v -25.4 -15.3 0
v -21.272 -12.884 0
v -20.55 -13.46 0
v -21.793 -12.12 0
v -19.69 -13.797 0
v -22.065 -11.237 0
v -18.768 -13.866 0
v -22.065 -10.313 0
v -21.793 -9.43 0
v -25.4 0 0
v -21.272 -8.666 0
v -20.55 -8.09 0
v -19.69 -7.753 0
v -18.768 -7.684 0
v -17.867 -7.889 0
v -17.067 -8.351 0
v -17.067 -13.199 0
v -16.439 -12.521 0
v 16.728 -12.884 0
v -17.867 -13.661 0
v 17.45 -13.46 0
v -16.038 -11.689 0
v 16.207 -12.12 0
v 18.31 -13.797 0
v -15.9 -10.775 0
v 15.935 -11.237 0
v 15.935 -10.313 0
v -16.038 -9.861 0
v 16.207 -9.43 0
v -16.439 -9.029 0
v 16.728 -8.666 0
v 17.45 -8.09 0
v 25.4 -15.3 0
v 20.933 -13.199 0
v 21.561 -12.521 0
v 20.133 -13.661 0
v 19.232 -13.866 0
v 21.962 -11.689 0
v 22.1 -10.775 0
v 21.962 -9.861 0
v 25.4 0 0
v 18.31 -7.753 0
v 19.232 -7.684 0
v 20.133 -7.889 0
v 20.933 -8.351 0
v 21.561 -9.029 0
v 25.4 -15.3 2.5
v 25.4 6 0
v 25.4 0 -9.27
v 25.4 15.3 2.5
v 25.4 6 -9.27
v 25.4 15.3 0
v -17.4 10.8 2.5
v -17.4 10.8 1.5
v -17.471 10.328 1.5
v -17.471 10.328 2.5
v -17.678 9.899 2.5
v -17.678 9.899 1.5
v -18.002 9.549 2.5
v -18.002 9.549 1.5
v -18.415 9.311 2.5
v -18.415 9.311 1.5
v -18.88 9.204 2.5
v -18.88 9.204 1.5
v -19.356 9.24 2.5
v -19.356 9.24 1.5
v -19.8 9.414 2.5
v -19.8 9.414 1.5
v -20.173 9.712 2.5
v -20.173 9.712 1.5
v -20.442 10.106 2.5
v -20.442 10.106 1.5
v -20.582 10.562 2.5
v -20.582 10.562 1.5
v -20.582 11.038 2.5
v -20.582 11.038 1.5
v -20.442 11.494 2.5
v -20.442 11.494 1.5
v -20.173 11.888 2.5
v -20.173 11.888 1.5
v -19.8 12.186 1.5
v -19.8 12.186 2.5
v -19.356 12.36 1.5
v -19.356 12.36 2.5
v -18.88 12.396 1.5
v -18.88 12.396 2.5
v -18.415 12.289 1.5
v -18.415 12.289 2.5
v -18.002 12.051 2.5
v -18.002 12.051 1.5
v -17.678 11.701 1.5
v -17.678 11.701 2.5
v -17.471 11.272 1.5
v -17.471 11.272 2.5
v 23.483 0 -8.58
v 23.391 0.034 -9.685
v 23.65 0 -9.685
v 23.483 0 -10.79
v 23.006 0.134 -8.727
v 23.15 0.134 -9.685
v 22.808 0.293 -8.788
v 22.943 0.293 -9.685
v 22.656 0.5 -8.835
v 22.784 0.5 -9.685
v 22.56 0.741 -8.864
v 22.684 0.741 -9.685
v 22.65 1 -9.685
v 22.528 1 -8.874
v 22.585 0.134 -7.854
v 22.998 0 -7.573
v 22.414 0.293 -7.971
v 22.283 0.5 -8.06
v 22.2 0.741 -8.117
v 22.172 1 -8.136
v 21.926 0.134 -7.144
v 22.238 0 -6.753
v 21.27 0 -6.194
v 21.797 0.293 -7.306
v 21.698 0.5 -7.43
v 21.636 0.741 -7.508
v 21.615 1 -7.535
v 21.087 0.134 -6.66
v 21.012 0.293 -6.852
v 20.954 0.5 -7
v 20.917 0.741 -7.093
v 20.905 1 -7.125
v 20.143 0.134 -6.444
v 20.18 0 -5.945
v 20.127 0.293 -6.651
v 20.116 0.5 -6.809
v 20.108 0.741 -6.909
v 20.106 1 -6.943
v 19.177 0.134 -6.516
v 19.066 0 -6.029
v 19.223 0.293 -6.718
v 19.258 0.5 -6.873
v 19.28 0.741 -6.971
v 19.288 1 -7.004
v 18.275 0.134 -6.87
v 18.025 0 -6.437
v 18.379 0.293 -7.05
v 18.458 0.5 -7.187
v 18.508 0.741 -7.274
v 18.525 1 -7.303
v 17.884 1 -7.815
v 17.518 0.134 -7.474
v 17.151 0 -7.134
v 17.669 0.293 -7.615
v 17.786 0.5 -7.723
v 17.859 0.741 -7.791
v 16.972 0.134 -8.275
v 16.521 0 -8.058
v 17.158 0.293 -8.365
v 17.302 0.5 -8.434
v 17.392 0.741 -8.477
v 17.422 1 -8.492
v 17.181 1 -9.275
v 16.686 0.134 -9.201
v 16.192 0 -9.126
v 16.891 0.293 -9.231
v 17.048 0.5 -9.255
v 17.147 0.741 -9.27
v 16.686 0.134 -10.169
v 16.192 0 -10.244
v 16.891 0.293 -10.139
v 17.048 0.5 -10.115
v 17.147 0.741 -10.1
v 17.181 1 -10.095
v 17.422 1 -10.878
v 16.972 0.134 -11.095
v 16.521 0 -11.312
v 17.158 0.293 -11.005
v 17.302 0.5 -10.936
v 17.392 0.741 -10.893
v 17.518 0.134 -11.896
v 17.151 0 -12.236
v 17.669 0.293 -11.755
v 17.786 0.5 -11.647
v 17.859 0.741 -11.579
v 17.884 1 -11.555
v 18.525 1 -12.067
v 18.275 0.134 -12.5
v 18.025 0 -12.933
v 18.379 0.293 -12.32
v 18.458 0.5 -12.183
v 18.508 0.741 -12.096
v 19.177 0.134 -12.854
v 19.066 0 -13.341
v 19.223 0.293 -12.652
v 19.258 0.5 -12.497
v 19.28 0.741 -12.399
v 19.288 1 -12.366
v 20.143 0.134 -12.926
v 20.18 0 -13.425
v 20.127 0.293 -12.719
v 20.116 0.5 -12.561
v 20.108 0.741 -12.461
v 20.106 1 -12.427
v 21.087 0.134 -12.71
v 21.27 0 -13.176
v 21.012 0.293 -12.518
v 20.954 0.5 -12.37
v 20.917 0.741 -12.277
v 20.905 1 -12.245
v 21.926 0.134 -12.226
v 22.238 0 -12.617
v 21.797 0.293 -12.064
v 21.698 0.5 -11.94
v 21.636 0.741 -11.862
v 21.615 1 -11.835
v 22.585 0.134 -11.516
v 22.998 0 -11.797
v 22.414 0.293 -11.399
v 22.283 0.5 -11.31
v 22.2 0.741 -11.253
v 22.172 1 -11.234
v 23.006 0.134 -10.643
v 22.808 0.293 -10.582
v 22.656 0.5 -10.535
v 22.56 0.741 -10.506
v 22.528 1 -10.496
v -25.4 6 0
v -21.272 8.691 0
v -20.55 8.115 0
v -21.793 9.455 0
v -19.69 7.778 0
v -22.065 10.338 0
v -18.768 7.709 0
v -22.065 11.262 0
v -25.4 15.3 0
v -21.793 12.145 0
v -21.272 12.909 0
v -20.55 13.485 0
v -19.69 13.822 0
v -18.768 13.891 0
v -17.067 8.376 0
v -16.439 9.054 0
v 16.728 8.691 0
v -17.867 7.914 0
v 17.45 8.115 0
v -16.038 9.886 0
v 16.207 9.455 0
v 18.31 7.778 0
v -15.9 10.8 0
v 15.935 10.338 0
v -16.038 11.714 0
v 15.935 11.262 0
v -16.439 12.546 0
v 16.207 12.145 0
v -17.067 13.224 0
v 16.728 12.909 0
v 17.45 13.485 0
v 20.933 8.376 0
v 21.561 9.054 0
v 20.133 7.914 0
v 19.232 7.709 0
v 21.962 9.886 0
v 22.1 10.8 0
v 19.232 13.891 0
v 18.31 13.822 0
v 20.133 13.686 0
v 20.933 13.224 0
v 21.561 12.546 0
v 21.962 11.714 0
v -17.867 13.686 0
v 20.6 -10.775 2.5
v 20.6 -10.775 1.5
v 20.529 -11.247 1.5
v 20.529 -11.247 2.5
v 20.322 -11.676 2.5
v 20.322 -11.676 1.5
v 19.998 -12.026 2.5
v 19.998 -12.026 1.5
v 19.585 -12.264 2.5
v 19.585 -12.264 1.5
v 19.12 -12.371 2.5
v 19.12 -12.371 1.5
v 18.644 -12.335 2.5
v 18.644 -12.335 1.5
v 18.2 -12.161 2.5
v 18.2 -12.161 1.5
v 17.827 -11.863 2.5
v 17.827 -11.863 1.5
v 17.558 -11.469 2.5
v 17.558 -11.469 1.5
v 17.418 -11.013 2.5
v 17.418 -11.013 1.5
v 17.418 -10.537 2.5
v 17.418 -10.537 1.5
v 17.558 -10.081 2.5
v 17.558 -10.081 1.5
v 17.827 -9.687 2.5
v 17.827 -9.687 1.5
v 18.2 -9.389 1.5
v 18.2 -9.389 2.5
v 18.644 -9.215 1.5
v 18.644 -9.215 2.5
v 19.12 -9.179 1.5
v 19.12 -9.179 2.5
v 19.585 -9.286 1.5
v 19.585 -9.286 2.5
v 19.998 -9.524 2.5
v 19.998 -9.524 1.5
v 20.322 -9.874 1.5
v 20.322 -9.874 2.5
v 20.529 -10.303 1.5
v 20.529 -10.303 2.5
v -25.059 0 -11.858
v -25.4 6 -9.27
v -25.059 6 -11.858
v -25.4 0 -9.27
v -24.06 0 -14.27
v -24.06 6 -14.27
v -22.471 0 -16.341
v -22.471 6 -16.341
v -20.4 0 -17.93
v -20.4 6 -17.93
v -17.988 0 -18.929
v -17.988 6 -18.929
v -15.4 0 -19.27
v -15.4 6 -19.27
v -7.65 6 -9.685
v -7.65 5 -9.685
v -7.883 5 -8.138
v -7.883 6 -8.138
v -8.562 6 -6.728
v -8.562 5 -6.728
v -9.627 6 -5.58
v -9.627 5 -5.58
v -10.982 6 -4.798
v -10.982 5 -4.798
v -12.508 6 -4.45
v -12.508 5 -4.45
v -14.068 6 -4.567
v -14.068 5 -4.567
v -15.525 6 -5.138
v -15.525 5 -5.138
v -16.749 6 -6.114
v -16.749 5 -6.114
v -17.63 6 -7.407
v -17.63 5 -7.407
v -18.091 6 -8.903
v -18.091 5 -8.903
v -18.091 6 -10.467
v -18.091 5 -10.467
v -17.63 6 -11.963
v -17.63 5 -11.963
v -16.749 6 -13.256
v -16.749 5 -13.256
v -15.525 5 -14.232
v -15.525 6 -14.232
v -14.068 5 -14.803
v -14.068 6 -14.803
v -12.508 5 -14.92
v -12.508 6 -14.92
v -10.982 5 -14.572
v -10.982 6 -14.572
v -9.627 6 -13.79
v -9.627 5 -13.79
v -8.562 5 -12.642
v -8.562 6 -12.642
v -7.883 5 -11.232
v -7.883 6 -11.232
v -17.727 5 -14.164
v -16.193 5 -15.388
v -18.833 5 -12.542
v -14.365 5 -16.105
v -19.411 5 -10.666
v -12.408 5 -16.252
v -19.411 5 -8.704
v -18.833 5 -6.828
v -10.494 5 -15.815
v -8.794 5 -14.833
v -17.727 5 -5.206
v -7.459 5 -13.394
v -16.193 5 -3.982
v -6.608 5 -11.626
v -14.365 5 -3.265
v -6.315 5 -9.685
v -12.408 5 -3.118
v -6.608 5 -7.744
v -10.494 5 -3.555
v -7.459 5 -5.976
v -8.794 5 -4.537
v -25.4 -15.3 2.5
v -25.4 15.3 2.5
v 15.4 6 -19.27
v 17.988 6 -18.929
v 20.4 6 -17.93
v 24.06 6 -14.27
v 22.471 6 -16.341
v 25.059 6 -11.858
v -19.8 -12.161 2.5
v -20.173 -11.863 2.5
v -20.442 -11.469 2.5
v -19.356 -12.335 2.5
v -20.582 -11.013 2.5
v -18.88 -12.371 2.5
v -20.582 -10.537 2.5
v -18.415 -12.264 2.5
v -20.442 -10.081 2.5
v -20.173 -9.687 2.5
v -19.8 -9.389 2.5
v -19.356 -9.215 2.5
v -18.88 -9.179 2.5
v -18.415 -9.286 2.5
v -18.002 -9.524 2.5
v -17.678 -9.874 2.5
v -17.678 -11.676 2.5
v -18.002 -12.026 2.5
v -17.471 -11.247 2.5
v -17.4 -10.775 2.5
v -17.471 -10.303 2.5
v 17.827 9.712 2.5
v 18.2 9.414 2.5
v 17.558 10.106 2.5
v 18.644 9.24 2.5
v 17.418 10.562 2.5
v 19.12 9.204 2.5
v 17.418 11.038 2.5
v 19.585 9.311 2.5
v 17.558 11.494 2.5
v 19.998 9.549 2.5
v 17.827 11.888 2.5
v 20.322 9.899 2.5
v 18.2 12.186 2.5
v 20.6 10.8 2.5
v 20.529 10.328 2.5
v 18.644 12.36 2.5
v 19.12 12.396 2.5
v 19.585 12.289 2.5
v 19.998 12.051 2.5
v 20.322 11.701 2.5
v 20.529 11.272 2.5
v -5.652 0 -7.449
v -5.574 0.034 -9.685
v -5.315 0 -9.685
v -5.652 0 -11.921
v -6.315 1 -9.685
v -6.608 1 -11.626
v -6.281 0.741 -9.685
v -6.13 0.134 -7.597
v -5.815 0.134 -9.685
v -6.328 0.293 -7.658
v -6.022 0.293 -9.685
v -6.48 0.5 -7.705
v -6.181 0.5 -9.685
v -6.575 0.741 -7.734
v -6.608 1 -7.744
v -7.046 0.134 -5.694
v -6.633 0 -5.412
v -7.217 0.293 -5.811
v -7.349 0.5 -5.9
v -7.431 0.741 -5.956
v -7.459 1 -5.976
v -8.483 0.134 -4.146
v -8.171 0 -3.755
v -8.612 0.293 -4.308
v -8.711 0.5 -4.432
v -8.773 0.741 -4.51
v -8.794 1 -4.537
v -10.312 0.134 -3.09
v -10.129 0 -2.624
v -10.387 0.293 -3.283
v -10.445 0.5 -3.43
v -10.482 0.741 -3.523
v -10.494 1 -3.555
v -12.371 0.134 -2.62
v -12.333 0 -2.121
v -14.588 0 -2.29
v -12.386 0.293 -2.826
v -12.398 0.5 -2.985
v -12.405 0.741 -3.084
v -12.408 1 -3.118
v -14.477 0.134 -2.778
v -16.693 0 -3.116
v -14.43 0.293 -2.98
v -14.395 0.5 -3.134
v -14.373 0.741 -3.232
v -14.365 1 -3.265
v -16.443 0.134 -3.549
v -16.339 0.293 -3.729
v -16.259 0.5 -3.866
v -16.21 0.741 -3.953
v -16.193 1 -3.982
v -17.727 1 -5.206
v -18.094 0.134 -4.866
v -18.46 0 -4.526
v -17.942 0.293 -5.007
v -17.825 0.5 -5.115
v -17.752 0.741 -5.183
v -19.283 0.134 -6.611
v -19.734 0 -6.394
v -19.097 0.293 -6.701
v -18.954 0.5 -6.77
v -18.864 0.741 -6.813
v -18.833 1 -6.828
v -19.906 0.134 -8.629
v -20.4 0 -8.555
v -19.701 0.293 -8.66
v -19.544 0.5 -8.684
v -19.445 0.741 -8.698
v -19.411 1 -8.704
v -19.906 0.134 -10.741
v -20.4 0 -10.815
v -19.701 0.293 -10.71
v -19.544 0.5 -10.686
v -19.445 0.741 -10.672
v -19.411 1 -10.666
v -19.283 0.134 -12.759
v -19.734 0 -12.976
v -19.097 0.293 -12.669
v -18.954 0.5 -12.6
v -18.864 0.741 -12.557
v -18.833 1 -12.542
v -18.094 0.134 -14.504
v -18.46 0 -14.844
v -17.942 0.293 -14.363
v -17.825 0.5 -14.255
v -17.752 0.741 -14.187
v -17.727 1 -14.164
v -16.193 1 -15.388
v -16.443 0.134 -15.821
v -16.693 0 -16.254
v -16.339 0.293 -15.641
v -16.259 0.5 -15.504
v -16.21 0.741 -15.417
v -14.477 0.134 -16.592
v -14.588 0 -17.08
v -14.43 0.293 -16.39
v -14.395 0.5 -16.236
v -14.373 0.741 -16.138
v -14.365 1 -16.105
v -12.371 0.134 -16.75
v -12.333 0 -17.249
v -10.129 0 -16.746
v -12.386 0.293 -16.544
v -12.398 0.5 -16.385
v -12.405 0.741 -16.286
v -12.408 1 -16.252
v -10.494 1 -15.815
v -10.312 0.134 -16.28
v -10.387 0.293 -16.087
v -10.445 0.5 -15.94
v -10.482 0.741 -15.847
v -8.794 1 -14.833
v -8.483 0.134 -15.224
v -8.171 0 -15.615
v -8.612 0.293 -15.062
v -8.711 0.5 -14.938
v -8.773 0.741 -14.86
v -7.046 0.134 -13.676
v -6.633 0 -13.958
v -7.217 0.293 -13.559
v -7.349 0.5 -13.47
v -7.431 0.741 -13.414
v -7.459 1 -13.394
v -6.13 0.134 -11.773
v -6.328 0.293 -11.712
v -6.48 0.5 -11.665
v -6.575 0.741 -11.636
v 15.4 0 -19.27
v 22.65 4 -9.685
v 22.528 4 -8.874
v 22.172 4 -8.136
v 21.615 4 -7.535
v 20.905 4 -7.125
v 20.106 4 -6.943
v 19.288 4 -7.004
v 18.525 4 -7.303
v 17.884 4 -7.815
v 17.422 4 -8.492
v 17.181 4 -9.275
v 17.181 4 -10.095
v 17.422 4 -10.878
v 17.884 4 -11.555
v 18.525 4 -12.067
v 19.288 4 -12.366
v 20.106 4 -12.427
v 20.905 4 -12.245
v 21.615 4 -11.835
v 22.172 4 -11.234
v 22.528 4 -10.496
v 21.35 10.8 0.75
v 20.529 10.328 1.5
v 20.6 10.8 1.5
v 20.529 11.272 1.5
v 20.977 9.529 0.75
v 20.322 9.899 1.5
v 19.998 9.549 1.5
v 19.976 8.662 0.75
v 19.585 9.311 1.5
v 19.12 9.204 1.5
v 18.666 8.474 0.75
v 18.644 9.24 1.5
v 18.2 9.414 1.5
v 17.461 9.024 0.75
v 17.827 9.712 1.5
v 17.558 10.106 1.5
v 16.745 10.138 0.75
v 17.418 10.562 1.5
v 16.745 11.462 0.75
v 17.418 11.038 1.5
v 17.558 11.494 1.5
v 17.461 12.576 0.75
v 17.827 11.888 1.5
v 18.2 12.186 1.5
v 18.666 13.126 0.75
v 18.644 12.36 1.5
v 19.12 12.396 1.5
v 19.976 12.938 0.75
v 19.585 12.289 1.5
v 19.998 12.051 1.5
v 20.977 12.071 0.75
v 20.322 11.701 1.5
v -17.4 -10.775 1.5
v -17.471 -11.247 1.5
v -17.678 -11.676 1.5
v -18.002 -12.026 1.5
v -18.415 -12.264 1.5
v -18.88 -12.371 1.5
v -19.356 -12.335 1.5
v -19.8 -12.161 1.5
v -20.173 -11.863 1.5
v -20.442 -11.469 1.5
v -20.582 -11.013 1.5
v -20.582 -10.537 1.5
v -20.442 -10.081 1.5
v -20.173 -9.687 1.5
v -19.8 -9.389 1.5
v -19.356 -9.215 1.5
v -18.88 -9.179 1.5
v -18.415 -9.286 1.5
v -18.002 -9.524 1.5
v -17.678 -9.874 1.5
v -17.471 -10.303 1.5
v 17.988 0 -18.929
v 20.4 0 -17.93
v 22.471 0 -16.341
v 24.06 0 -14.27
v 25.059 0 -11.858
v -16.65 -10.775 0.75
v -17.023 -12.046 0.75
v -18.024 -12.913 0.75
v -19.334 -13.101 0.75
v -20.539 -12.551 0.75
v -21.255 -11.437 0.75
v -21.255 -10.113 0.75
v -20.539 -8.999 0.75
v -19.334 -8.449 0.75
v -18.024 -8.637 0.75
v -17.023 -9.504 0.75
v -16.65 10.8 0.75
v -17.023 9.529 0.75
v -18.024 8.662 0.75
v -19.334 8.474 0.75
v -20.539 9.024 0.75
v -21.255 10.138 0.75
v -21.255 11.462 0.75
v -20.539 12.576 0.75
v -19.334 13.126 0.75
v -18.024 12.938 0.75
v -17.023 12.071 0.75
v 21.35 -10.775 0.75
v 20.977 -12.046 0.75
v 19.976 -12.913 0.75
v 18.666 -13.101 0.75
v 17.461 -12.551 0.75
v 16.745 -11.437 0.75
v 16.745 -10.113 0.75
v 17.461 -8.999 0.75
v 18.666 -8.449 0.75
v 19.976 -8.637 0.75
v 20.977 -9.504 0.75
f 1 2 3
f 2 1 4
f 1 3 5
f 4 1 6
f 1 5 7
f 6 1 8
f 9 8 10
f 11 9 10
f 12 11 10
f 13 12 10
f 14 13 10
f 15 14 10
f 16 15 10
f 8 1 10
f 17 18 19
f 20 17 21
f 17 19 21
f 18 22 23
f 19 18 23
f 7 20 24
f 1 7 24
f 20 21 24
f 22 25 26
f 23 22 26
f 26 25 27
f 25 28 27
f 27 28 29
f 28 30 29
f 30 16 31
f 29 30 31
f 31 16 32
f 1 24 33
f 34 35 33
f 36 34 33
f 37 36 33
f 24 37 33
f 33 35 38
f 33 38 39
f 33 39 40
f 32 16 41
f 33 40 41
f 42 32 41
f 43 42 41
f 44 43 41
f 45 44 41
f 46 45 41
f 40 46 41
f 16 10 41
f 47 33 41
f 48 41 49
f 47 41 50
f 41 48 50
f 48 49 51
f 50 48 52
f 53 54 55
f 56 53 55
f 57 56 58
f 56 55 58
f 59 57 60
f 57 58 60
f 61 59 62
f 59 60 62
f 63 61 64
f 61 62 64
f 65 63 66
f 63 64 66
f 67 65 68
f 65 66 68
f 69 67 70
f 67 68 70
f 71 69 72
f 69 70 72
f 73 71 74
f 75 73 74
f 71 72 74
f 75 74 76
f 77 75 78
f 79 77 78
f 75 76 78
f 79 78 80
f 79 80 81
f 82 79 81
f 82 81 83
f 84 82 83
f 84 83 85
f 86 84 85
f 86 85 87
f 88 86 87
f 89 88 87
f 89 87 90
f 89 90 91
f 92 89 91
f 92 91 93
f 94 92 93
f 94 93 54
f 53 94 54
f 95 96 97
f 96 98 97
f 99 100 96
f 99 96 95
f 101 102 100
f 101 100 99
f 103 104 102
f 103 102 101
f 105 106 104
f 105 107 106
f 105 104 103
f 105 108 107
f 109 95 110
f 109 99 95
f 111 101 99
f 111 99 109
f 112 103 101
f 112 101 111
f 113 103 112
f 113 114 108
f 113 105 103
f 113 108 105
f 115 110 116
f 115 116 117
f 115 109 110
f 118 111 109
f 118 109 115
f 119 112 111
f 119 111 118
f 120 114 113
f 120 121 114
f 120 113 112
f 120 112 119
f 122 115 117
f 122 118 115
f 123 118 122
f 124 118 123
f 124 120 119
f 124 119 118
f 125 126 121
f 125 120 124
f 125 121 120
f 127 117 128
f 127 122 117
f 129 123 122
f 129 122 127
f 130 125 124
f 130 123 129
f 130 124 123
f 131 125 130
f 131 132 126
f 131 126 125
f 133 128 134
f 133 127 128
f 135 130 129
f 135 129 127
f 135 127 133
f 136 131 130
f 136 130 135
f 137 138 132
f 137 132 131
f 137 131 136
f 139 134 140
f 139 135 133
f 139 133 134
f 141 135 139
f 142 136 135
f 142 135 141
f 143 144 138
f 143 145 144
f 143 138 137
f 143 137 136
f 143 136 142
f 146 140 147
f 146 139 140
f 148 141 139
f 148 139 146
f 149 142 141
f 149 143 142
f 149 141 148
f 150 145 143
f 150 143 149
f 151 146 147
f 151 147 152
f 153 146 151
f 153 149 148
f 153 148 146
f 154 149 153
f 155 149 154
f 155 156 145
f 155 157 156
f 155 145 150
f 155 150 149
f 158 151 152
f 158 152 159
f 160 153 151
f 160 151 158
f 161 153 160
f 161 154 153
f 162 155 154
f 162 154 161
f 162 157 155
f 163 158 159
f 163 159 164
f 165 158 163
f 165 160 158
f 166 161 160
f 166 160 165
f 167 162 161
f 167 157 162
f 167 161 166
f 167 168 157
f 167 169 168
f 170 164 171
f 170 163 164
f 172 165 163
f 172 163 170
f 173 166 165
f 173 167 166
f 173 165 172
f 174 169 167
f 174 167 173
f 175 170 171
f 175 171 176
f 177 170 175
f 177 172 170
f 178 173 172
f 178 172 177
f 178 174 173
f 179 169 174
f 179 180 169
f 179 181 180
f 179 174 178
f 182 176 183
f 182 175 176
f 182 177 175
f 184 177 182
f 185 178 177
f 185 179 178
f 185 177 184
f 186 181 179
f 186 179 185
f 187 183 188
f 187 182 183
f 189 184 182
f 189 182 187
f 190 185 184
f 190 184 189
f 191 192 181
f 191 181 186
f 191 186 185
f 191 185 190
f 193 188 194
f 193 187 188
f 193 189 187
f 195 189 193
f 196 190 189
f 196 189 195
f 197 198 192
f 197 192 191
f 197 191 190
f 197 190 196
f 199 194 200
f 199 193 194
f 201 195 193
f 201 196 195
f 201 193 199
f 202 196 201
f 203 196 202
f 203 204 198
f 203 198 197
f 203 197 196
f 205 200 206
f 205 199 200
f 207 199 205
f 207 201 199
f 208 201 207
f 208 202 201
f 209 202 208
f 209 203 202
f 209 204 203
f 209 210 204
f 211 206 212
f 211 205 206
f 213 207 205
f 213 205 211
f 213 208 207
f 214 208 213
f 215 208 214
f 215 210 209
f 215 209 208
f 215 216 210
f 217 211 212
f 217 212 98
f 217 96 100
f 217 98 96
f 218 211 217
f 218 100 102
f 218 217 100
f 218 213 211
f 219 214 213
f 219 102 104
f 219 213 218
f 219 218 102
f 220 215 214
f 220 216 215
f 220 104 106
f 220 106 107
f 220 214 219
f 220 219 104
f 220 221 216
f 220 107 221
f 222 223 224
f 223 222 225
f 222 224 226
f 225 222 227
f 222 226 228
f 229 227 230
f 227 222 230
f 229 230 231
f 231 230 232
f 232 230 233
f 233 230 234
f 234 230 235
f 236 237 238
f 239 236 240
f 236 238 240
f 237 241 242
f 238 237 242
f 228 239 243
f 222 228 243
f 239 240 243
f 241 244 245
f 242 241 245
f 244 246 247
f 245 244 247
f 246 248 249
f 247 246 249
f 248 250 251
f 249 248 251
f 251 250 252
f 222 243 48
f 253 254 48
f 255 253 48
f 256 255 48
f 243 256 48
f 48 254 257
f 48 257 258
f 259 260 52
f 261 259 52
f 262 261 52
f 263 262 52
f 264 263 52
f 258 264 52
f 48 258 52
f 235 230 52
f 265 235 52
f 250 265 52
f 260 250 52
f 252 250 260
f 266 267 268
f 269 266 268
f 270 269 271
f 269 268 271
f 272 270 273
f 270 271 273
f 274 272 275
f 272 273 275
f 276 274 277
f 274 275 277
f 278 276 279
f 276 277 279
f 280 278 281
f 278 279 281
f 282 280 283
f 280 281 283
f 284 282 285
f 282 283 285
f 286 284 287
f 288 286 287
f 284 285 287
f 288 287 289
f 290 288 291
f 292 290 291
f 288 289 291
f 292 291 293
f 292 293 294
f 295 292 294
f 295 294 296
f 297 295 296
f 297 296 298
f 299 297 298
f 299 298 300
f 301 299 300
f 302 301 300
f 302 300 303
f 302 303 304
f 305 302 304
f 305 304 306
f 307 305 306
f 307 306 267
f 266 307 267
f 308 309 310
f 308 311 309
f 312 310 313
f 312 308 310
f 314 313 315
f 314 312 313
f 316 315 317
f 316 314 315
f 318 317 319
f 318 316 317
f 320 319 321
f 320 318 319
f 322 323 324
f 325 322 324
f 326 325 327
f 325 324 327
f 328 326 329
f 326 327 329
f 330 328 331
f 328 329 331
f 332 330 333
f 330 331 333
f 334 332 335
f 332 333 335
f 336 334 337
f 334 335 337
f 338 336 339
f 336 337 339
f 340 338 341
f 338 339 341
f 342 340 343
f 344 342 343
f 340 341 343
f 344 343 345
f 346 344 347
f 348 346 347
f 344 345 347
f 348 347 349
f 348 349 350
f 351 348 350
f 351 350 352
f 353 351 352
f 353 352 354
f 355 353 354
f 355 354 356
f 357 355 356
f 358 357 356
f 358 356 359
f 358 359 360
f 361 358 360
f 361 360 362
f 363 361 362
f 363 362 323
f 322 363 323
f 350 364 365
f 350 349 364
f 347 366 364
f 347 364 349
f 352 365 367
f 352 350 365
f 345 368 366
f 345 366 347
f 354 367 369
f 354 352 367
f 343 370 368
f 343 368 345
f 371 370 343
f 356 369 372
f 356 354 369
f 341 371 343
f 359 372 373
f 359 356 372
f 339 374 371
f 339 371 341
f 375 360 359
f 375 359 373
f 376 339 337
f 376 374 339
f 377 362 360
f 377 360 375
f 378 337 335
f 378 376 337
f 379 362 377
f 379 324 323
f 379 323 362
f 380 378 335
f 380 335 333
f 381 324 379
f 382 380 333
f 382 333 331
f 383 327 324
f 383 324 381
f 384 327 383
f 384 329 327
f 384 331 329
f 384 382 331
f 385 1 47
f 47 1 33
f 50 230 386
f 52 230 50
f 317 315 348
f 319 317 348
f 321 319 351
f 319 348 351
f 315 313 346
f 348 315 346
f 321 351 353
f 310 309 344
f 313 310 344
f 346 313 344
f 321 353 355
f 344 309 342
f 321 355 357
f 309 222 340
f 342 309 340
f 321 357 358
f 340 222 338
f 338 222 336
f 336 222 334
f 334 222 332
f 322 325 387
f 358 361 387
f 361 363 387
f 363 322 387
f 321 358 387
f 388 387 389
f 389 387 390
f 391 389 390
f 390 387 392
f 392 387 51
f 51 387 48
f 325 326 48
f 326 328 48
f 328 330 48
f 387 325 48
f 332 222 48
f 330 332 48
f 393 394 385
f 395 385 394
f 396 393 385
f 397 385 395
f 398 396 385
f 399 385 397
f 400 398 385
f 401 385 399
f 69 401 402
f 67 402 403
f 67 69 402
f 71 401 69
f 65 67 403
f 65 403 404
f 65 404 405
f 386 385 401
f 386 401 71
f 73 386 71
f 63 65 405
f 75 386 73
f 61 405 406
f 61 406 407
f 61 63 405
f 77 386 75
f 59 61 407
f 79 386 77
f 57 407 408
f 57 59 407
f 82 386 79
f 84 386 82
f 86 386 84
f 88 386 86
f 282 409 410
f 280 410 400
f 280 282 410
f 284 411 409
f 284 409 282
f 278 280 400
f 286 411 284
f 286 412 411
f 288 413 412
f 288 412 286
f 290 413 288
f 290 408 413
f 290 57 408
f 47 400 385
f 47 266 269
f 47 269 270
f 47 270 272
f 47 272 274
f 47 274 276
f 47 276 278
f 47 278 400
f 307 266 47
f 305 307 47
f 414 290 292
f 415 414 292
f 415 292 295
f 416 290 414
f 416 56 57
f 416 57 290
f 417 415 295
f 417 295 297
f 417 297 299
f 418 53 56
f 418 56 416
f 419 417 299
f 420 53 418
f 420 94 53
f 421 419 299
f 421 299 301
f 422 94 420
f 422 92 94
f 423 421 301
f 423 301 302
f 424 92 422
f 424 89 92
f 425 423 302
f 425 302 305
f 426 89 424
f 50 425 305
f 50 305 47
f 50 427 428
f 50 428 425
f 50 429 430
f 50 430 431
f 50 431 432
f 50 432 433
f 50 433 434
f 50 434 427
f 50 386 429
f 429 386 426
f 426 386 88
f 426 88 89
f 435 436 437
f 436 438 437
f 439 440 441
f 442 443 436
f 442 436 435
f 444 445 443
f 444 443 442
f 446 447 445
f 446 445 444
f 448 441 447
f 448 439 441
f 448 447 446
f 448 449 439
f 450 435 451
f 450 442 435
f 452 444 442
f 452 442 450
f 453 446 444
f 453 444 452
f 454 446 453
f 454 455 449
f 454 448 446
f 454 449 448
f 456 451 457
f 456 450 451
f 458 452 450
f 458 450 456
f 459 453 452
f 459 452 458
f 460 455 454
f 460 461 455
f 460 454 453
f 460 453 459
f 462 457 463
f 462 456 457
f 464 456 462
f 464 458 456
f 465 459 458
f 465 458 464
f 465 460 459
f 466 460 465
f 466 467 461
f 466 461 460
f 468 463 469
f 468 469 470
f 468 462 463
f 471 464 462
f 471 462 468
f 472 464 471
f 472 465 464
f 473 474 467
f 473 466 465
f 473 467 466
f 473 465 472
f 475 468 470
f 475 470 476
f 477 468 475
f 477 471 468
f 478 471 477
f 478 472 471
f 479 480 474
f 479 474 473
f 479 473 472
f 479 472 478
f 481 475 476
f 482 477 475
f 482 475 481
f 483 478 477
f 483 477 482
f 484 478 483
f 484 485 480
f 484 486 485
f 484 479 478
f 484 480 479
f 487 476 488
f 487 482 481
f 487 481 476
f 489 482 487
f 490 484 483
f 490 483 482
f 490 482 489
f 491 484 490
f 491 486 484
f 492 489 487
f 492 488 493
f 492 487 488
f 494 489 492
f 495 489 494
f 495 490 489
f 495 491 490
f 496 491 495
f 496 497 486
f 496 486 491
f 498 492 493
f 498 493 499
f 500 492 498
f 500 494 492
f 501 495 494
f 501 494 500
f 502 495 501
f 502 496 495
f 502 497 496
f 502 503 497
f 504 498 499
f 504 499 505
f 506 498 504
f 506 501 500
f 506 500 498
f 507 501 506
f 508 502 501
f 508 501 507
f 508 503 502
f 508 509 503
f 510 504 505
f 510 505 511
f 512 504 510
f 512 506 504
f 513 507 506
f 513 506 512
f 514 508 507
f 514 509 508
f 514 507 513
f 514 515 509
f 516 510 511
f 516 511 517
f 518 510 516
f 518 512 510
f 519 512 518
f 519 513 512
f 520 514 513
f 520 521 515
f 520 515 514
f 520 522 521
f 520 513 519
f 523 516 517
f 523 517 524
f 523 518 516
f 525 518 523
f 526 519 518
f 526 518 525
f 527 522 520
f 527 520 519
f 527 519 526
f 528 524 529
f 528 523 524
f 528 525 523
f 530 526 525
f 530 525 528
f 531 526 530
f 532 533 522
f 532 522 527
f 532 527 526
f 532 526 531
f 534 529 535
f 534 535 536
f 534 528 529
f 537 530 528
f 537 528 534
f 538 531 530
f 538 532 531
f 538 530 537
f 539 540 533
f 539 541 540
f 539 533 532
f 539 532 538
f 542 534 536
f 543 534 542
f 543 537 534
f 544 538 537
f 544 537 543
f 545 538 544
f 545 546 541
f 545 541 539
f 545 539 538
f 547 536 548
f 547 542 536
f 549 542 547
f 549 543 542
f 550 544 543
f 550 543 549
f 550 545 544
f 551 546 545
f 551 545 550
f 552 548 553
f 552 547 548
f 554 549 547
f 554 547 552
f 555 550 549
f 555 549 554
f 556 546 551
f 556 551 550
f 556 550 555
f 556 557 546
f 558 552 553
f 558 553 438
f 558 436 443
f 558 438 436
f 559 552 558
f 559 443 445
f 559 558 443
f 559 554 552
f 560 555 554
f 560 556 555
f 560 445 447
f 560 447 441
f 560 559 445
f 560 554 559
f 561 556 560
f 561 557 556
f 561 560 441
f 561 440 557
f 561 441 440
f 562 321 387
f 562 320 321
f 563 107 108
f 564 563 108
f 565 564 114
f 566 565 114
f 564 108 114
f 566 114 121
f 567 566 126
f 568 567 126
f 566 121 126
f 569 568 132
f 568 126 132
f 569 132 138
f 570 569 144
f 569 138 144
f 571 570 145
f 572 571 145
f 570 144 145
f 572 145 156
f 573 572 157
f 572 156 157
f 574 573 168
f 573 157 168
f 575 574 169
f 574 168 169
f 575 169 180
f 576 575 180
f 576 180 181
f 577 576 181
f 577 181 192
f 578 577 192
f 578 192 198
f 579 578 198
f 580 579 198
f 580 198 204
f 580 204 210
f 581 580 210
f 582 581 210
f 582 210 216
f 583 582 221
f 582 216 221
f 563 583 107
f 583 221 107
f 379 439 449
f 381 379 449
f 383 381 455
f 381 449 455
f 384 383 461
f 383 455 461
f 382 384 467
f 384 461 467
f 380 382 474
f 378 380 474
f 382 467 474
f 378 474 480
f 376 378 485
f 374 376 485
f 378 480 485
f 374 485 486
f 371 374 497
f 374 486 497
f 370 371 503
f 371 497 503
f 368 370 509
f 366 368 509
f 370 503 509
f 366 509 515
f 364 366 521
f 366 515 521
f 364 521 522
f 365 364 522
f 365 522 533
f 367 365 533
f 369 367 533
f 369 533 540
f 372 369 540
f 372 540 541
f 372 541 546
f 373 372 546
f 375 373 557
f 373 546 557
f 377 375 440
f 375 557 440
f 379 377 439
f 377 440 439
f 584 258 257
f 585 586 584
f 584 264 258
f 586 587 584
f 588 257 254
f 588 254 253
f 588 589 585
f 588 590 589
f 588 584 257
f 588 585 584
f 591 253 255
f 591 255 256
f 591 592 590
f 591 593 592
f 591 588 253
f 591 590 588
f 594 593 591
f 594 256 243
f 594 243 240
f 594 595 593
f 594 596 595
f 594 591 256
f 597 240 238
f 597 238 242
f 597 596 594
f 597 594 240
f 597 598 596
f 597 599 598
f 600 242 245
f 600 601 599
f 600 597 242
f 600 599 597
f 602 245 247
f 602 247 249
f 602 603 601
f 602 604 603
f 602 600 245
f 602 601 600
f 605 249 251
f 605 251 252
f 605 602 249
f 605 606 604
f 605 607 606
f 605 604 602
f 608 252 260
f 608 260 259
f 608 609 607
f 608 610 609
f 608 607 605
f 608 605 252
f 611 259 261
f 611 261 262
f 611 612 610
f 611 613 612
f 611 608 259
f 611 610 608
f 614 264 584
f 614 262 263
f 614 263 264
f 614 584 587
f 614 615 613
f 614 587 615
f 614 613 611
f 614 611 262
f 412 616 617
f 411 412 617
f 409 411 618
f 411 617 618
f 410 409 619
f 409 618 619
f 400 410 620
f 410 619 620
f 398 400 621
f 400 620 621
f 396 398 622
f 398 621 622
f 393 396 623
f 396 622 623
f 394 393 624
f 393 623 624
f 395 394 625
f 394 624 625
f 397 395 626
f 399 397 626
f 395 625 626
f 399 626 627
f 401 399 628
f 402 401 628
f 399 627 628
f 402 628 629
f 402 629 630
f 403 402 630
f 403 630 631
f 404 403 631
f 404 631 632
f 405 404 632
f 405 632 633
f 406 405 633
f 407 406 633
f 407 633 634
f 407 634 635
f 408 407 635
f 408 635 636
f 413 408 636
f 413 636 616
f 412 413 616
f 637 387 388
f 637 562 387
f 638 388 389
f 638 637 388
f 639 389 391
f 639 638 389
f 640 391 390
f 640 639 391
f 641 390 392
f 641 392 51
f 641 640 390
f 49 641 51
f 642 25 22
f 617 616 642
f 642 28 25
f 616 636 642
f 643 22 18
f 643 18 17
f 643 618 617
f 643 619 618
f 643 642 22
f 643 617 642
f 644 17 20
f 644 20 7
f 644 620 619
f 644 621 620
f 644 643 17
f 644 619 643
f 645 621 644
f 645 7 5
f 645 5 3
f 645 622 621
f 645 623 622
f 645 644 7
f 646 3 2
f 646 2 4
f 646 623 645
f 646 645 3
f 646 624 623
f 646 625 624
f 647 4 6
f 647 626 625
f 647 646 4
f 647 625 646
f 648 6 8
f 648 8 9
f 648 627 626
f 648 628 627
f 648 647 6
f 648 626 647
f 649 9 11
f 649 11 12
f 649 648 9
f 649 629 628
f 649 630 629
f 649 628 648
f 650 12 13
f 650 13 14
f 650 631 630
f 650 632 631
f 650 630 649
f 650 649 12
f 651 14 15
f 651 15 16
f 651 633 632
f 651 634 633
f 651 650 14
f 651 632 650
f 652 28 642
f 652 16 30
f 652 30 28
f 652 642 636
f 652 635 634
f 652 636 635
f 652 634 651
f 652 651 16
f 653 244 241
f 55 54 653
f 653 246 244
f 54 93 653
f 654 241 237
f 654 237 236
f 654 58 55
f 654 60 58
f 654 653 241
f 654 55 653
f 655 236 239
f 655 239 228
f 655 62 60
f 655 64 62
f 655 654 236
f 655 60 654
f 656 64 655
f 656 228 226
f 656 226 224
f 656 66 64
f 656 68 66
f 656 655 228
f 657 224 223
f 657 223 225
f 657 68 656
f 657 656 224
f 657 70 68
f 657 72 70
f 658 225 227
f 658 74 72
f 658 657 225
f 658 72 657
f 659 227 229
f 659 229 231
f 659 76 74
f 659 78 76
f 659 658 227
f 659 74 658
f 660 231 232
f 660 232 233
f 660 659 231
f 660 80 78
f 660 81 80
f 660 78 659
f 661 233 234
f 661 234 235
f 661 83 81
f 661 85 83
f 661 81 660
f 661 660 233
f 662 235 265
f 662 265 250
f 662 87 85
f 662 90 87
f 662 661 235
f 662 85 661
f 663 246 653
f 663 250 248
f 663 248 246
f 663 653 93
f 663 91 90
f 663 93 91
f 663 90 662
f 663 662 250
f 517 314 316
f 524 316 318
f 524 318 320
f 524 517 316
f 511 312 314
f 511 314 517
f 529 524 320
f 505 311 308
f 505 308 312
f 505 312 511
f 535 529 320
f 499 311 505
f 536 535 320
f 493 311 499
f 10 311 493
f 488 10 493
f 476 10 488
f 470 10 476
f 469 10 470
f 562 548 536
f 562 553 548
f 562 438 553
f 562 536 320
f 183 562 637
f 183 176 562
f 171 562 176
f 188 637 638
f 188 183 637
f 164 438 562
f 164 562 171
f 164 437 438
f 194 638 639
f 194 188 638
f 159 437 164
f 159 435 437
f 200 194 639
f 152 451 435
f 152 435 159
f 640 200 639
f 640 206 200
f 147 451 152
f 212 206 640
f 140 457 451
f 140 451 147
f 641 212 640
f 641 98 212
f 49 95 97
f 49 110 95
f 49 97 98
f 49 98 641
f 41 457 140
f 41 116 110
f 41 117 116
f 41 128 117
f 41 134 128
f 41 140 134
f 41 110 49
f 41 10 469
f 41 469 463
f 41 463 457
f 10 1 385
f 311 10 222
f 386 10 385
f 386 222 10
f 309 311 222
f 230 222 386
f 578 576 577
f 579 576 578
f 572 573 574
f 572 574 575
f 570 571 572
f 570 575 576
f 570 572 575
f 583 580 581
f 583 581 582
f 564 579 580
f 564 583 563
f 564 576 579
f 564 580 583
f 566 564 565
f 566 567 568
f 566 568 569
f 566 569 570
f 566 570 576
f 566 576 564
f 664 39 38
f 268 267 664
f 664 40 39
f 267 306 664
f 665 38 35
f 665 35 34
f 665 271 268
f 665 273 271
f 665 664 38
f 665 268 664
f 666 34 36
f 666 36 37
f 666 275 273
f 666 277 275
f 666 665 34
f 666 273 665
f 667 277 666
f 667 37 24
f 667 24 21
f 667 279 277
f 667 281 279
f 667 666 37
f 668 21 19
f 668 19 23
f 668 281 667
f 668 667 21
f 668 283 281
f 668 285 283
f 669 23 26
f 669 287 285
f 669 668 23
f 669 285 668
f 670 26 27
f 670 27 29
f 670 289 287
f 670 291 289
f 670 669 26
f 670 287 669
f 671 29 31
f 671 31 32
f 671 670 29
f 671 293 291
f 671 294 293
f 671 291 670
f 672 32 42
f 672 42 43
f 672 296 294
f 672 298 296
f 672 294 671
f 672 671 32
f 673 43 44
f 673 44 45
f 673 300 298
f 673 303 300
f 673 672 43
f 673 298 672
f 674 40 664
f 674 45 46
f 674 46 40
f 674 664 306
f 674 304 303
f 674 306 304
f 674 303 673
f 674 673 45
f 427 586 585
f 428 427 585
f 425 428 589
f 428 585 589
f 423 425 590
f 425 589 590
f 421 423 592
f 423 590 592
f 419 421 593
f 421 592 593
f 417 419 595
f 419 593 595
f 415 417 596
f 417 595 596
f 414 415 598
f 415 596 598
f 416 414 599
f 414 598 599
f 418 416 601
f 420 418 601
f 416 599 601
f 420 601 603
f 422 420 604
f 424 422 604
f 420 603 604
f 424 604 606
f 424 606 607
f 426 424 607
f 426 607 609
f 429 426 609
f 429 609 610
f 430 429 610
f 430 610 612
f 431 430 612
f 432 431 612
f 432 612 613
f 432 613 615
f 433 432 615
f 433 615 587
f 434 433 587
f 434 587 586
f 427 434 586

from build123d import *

# Parameters (mm, degrees)
SKETCH084_W     = 50.8
SKETCH084_H     = 30.6
PAD021_DEPTH    = 2.5
SKETCH085_R     = 1.6
POCKET071_DEPTH = 2.501
SKETCH086_W     = 50.8
SKETCH086_H     = 6
PAD022_DEPTH    = 19.27
SKETCH087_R     = 6.585
POCKET072_DEPTH = 5
SKETCH088_R     = 2.75
POCKET073_DEPTH = 4
SKETCH089_R     = 5.25
POCKET074_DEPTH = 10.301
CHAMFER013_SIZE = 1.5
FILLET002_R     = 1
FILLET003_R     = 10


with BuildPart() as part:
    # Sketch084 → Pad021 (new body)
    with BuildSketch(Plane.XY):
        Rectangle(SKETCH084_W, SKETCH084_H)
    extrude(amount=PAD021_DEPTH)

    # Sketch085 (on Face5 of Pad021) → Pocket071 (cut, through all)
    with BuildSketch(Plane(origin=(0, 0, 0), x_dir=(1, 0, 0), z_dir=(0, 0, -1))):
        with Locations((-19, 10.775)):
            Circle(SKETCH085_R)
        with Locations((19, 10.775)):
            Circle(SKETCH085_R)
        with Locations((19, -10.8)):
            Circle(SKETCH085_R)
        with Locations((-19, -10.8)):
            Circle(SKETCH085_R)
    extrude(amount=-POCKET071_DEPTH, mode=Mode.SUBTRACT)

    # Sketch086 (on Face4 of Pocket071) → Pad022 (join)
    with BuildSketch(Plane(origin=(0, 0, 0), x_dir=(1, 0, 0), z_dir=(0, 0, -1))):
        with Locations((0, -3)):
            Rectangle(SKETCH086_W, SKETCH086_H)
    extrude(amount=PAD022_DEPTH)

    # Sketch087 (on Face12 of Pad022) → Pocket072 (cut)
    with BuildSketch(Plane.XZ):
        with Locations((-12.9, -9.685)):
            Circle(SKETCH087_R)
    extrude(amount=-POCKET072_DEPTH, mode=Mode.SUBTRACT)

    # Sketch088 (on Face12 of Pocket072) → Pocket073 (cut)
    with BuildSketch(Plane.XZ):
        with Locations((19.9, -9.685)):
            Circle(SKETCH088_R)
    extrude(amount=-POCKET073_DEPTH, mode=Mode.SUBTRACT)

    # Sketch089 (on Face20 of Pocket073) → Pocket074 (cut, through all)
    with BuildSketch(Plane.XZ.offset(-5)):
        with Locations((-12.9, -9.685)):
            Circle(SKETCH089_R)
    extrude(amount=-POCKET074_DEPTH, mode=Mode.SUBTRACT)

    # Chamfer013
    chamfer013_edges = [part.edges().sort_by_distance(p)[0] for p in [
        (-20.6, -10.775, 0),
        (17.4, -10.775, 0),
        (17.4, 10.8, 0),
        (-20.6, 10.8, 0),
    ]]
    chamfer(chamfer013_edges, length=CHAMFER013_SIZE)

    # Fillet002
    fillet002_edges = [part.edges().sort_by_distance(p)[0] for p in [
        (-19.485, 0, -9.685),
        (17.15, 0, -9.685),
    ]]
    fillet(fillet002_edges, radius=FILLET002_R)

    # Fillet003
    fillet003_edges = [part.edges().sort_by_distance(p)[0] for p in [
        (-25.4, 3, -19.27),
        (25.4, 3, -19.27),
    ]]
    fillet(fillet003_edges, radius=FILLET003_R)


solid = part.part
